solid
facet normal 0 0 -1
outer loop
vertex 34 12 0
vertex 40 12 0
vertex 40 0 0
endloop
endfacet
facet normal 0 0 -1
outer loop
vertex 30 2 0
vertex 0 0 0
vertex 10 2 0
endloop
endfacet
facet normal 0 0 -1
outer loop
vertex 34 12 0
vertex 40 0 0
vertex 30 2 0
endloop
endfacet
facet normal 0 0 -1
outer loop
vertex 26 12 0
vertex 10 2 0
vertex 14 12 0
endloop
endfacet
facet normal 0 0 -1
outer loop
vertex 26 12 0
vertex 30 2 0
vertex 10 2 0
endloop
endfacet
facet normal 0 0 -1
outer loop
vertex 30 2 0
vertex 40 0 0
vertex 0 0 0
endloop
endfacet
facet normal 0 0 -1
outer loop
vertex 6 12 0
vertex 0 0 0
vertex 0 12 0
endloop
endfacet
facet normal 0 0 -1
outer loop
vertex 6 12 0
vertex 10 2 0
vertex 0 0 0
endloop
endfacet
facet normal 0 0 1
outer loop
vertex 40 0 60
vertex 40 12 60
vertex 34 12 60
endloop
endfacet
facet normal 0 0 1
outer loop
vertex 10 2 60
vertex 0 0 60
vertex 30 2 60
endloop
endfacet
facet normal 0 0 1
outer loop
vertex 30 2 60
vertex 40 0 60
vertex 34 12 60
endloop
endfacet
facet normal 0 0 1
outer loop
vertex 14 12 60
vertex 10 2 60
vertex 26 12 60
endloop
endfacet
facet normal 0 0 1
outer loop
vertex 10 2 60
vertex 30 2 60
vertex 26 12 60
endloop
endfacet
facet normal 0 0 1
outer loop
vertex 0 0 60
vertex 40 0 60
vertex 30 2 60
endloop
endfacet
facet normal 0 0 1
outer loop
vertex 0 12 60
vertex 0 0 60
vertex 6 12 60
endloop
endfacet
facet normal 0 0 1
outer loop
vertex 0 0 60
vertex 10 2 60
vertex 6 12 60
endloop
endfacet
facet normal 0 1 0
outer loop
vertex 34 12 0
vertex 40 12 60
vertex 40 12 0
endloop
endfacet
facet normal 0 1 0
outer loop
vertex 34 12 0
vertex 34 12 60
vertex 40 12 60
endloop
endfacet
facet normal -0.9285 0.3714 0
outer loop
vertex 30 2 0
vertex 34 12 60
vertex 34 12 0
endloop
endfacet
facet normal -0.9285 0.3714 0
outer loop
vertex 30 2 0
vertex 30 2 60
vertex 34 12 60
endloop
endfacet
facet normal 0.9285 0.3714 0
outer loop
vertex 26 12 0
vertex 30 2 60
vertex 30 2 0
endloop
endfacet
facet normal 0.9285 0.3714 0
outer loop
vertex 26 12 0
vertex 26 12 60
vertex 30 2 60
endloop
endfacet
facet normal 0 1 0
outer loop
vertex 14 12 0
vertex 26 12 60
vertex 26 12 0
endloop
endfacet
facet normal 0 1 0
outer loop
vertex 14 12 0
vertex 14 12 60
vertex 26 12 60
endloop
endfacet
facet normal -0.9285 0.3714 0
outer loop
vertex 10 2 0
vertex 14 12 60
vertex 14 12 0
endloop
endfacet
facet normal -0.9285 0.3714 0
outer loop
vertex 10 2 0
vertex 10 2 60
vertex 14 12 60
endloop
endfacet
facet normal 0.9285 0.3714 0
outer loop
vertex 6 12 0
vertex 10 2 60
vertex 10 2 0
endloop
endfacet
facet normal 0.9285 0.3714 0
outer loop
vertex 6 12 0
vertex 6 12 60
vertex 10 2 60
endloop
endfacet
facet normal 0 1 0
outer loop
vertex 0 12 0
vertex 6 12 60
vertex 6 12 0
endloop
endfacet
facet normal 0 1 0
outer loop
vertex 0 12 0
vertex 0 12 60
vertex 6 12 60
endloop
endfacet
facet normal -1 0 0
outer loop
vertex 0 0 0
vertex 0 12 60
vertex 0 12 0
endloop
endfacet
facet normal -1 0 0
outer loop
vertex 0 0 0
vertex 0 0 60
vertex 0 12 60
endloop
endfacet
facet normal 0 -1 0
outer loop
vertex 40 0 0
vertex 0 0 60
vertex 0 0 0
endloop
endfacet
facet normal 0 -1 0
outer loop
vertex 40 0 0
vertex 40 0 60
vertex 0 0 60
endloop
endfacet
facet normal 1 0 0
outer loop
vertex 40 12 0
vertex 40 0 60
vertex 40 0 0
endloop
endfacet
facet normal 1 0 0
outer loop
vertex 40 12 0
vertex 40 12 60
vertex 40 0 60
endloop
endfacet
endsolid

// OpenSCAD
$fn = 32;

// ----------------------------------------------------------------------
// V guide rail: doublev, 40 mm wide
// ----------------------------------------------------------------------

// --- parameters (mm) ---
rail_w = 40;              // rail width, X
base_t = 12;              // base plate thickness
v_depth = 10;             // V feature depth / height
v_half_w = 8;             // half width of the V at the base face
plate_t = 60;             // rail length, Z (the extrusion height)
groove_off = 10;          // offset of each groove from the centreline

centre_x = rail_w / 2;  // rail centreline
groove_a = centre_x - groove_off;  // axis of the first groove
groove_b = centre_x + groove_off;  // axis of the second groove

profile = [[0, 0], [40, 0], [40, 12], [34, 12], [30, 2], [26, 12], [14, 12], [10, 2], [6, 12], [0, 12]];  // primary outline, 10 points, counter clockwise

// --- the one profile operation ---
linear_extrude(height = plate_t) polygon(points = profile);
